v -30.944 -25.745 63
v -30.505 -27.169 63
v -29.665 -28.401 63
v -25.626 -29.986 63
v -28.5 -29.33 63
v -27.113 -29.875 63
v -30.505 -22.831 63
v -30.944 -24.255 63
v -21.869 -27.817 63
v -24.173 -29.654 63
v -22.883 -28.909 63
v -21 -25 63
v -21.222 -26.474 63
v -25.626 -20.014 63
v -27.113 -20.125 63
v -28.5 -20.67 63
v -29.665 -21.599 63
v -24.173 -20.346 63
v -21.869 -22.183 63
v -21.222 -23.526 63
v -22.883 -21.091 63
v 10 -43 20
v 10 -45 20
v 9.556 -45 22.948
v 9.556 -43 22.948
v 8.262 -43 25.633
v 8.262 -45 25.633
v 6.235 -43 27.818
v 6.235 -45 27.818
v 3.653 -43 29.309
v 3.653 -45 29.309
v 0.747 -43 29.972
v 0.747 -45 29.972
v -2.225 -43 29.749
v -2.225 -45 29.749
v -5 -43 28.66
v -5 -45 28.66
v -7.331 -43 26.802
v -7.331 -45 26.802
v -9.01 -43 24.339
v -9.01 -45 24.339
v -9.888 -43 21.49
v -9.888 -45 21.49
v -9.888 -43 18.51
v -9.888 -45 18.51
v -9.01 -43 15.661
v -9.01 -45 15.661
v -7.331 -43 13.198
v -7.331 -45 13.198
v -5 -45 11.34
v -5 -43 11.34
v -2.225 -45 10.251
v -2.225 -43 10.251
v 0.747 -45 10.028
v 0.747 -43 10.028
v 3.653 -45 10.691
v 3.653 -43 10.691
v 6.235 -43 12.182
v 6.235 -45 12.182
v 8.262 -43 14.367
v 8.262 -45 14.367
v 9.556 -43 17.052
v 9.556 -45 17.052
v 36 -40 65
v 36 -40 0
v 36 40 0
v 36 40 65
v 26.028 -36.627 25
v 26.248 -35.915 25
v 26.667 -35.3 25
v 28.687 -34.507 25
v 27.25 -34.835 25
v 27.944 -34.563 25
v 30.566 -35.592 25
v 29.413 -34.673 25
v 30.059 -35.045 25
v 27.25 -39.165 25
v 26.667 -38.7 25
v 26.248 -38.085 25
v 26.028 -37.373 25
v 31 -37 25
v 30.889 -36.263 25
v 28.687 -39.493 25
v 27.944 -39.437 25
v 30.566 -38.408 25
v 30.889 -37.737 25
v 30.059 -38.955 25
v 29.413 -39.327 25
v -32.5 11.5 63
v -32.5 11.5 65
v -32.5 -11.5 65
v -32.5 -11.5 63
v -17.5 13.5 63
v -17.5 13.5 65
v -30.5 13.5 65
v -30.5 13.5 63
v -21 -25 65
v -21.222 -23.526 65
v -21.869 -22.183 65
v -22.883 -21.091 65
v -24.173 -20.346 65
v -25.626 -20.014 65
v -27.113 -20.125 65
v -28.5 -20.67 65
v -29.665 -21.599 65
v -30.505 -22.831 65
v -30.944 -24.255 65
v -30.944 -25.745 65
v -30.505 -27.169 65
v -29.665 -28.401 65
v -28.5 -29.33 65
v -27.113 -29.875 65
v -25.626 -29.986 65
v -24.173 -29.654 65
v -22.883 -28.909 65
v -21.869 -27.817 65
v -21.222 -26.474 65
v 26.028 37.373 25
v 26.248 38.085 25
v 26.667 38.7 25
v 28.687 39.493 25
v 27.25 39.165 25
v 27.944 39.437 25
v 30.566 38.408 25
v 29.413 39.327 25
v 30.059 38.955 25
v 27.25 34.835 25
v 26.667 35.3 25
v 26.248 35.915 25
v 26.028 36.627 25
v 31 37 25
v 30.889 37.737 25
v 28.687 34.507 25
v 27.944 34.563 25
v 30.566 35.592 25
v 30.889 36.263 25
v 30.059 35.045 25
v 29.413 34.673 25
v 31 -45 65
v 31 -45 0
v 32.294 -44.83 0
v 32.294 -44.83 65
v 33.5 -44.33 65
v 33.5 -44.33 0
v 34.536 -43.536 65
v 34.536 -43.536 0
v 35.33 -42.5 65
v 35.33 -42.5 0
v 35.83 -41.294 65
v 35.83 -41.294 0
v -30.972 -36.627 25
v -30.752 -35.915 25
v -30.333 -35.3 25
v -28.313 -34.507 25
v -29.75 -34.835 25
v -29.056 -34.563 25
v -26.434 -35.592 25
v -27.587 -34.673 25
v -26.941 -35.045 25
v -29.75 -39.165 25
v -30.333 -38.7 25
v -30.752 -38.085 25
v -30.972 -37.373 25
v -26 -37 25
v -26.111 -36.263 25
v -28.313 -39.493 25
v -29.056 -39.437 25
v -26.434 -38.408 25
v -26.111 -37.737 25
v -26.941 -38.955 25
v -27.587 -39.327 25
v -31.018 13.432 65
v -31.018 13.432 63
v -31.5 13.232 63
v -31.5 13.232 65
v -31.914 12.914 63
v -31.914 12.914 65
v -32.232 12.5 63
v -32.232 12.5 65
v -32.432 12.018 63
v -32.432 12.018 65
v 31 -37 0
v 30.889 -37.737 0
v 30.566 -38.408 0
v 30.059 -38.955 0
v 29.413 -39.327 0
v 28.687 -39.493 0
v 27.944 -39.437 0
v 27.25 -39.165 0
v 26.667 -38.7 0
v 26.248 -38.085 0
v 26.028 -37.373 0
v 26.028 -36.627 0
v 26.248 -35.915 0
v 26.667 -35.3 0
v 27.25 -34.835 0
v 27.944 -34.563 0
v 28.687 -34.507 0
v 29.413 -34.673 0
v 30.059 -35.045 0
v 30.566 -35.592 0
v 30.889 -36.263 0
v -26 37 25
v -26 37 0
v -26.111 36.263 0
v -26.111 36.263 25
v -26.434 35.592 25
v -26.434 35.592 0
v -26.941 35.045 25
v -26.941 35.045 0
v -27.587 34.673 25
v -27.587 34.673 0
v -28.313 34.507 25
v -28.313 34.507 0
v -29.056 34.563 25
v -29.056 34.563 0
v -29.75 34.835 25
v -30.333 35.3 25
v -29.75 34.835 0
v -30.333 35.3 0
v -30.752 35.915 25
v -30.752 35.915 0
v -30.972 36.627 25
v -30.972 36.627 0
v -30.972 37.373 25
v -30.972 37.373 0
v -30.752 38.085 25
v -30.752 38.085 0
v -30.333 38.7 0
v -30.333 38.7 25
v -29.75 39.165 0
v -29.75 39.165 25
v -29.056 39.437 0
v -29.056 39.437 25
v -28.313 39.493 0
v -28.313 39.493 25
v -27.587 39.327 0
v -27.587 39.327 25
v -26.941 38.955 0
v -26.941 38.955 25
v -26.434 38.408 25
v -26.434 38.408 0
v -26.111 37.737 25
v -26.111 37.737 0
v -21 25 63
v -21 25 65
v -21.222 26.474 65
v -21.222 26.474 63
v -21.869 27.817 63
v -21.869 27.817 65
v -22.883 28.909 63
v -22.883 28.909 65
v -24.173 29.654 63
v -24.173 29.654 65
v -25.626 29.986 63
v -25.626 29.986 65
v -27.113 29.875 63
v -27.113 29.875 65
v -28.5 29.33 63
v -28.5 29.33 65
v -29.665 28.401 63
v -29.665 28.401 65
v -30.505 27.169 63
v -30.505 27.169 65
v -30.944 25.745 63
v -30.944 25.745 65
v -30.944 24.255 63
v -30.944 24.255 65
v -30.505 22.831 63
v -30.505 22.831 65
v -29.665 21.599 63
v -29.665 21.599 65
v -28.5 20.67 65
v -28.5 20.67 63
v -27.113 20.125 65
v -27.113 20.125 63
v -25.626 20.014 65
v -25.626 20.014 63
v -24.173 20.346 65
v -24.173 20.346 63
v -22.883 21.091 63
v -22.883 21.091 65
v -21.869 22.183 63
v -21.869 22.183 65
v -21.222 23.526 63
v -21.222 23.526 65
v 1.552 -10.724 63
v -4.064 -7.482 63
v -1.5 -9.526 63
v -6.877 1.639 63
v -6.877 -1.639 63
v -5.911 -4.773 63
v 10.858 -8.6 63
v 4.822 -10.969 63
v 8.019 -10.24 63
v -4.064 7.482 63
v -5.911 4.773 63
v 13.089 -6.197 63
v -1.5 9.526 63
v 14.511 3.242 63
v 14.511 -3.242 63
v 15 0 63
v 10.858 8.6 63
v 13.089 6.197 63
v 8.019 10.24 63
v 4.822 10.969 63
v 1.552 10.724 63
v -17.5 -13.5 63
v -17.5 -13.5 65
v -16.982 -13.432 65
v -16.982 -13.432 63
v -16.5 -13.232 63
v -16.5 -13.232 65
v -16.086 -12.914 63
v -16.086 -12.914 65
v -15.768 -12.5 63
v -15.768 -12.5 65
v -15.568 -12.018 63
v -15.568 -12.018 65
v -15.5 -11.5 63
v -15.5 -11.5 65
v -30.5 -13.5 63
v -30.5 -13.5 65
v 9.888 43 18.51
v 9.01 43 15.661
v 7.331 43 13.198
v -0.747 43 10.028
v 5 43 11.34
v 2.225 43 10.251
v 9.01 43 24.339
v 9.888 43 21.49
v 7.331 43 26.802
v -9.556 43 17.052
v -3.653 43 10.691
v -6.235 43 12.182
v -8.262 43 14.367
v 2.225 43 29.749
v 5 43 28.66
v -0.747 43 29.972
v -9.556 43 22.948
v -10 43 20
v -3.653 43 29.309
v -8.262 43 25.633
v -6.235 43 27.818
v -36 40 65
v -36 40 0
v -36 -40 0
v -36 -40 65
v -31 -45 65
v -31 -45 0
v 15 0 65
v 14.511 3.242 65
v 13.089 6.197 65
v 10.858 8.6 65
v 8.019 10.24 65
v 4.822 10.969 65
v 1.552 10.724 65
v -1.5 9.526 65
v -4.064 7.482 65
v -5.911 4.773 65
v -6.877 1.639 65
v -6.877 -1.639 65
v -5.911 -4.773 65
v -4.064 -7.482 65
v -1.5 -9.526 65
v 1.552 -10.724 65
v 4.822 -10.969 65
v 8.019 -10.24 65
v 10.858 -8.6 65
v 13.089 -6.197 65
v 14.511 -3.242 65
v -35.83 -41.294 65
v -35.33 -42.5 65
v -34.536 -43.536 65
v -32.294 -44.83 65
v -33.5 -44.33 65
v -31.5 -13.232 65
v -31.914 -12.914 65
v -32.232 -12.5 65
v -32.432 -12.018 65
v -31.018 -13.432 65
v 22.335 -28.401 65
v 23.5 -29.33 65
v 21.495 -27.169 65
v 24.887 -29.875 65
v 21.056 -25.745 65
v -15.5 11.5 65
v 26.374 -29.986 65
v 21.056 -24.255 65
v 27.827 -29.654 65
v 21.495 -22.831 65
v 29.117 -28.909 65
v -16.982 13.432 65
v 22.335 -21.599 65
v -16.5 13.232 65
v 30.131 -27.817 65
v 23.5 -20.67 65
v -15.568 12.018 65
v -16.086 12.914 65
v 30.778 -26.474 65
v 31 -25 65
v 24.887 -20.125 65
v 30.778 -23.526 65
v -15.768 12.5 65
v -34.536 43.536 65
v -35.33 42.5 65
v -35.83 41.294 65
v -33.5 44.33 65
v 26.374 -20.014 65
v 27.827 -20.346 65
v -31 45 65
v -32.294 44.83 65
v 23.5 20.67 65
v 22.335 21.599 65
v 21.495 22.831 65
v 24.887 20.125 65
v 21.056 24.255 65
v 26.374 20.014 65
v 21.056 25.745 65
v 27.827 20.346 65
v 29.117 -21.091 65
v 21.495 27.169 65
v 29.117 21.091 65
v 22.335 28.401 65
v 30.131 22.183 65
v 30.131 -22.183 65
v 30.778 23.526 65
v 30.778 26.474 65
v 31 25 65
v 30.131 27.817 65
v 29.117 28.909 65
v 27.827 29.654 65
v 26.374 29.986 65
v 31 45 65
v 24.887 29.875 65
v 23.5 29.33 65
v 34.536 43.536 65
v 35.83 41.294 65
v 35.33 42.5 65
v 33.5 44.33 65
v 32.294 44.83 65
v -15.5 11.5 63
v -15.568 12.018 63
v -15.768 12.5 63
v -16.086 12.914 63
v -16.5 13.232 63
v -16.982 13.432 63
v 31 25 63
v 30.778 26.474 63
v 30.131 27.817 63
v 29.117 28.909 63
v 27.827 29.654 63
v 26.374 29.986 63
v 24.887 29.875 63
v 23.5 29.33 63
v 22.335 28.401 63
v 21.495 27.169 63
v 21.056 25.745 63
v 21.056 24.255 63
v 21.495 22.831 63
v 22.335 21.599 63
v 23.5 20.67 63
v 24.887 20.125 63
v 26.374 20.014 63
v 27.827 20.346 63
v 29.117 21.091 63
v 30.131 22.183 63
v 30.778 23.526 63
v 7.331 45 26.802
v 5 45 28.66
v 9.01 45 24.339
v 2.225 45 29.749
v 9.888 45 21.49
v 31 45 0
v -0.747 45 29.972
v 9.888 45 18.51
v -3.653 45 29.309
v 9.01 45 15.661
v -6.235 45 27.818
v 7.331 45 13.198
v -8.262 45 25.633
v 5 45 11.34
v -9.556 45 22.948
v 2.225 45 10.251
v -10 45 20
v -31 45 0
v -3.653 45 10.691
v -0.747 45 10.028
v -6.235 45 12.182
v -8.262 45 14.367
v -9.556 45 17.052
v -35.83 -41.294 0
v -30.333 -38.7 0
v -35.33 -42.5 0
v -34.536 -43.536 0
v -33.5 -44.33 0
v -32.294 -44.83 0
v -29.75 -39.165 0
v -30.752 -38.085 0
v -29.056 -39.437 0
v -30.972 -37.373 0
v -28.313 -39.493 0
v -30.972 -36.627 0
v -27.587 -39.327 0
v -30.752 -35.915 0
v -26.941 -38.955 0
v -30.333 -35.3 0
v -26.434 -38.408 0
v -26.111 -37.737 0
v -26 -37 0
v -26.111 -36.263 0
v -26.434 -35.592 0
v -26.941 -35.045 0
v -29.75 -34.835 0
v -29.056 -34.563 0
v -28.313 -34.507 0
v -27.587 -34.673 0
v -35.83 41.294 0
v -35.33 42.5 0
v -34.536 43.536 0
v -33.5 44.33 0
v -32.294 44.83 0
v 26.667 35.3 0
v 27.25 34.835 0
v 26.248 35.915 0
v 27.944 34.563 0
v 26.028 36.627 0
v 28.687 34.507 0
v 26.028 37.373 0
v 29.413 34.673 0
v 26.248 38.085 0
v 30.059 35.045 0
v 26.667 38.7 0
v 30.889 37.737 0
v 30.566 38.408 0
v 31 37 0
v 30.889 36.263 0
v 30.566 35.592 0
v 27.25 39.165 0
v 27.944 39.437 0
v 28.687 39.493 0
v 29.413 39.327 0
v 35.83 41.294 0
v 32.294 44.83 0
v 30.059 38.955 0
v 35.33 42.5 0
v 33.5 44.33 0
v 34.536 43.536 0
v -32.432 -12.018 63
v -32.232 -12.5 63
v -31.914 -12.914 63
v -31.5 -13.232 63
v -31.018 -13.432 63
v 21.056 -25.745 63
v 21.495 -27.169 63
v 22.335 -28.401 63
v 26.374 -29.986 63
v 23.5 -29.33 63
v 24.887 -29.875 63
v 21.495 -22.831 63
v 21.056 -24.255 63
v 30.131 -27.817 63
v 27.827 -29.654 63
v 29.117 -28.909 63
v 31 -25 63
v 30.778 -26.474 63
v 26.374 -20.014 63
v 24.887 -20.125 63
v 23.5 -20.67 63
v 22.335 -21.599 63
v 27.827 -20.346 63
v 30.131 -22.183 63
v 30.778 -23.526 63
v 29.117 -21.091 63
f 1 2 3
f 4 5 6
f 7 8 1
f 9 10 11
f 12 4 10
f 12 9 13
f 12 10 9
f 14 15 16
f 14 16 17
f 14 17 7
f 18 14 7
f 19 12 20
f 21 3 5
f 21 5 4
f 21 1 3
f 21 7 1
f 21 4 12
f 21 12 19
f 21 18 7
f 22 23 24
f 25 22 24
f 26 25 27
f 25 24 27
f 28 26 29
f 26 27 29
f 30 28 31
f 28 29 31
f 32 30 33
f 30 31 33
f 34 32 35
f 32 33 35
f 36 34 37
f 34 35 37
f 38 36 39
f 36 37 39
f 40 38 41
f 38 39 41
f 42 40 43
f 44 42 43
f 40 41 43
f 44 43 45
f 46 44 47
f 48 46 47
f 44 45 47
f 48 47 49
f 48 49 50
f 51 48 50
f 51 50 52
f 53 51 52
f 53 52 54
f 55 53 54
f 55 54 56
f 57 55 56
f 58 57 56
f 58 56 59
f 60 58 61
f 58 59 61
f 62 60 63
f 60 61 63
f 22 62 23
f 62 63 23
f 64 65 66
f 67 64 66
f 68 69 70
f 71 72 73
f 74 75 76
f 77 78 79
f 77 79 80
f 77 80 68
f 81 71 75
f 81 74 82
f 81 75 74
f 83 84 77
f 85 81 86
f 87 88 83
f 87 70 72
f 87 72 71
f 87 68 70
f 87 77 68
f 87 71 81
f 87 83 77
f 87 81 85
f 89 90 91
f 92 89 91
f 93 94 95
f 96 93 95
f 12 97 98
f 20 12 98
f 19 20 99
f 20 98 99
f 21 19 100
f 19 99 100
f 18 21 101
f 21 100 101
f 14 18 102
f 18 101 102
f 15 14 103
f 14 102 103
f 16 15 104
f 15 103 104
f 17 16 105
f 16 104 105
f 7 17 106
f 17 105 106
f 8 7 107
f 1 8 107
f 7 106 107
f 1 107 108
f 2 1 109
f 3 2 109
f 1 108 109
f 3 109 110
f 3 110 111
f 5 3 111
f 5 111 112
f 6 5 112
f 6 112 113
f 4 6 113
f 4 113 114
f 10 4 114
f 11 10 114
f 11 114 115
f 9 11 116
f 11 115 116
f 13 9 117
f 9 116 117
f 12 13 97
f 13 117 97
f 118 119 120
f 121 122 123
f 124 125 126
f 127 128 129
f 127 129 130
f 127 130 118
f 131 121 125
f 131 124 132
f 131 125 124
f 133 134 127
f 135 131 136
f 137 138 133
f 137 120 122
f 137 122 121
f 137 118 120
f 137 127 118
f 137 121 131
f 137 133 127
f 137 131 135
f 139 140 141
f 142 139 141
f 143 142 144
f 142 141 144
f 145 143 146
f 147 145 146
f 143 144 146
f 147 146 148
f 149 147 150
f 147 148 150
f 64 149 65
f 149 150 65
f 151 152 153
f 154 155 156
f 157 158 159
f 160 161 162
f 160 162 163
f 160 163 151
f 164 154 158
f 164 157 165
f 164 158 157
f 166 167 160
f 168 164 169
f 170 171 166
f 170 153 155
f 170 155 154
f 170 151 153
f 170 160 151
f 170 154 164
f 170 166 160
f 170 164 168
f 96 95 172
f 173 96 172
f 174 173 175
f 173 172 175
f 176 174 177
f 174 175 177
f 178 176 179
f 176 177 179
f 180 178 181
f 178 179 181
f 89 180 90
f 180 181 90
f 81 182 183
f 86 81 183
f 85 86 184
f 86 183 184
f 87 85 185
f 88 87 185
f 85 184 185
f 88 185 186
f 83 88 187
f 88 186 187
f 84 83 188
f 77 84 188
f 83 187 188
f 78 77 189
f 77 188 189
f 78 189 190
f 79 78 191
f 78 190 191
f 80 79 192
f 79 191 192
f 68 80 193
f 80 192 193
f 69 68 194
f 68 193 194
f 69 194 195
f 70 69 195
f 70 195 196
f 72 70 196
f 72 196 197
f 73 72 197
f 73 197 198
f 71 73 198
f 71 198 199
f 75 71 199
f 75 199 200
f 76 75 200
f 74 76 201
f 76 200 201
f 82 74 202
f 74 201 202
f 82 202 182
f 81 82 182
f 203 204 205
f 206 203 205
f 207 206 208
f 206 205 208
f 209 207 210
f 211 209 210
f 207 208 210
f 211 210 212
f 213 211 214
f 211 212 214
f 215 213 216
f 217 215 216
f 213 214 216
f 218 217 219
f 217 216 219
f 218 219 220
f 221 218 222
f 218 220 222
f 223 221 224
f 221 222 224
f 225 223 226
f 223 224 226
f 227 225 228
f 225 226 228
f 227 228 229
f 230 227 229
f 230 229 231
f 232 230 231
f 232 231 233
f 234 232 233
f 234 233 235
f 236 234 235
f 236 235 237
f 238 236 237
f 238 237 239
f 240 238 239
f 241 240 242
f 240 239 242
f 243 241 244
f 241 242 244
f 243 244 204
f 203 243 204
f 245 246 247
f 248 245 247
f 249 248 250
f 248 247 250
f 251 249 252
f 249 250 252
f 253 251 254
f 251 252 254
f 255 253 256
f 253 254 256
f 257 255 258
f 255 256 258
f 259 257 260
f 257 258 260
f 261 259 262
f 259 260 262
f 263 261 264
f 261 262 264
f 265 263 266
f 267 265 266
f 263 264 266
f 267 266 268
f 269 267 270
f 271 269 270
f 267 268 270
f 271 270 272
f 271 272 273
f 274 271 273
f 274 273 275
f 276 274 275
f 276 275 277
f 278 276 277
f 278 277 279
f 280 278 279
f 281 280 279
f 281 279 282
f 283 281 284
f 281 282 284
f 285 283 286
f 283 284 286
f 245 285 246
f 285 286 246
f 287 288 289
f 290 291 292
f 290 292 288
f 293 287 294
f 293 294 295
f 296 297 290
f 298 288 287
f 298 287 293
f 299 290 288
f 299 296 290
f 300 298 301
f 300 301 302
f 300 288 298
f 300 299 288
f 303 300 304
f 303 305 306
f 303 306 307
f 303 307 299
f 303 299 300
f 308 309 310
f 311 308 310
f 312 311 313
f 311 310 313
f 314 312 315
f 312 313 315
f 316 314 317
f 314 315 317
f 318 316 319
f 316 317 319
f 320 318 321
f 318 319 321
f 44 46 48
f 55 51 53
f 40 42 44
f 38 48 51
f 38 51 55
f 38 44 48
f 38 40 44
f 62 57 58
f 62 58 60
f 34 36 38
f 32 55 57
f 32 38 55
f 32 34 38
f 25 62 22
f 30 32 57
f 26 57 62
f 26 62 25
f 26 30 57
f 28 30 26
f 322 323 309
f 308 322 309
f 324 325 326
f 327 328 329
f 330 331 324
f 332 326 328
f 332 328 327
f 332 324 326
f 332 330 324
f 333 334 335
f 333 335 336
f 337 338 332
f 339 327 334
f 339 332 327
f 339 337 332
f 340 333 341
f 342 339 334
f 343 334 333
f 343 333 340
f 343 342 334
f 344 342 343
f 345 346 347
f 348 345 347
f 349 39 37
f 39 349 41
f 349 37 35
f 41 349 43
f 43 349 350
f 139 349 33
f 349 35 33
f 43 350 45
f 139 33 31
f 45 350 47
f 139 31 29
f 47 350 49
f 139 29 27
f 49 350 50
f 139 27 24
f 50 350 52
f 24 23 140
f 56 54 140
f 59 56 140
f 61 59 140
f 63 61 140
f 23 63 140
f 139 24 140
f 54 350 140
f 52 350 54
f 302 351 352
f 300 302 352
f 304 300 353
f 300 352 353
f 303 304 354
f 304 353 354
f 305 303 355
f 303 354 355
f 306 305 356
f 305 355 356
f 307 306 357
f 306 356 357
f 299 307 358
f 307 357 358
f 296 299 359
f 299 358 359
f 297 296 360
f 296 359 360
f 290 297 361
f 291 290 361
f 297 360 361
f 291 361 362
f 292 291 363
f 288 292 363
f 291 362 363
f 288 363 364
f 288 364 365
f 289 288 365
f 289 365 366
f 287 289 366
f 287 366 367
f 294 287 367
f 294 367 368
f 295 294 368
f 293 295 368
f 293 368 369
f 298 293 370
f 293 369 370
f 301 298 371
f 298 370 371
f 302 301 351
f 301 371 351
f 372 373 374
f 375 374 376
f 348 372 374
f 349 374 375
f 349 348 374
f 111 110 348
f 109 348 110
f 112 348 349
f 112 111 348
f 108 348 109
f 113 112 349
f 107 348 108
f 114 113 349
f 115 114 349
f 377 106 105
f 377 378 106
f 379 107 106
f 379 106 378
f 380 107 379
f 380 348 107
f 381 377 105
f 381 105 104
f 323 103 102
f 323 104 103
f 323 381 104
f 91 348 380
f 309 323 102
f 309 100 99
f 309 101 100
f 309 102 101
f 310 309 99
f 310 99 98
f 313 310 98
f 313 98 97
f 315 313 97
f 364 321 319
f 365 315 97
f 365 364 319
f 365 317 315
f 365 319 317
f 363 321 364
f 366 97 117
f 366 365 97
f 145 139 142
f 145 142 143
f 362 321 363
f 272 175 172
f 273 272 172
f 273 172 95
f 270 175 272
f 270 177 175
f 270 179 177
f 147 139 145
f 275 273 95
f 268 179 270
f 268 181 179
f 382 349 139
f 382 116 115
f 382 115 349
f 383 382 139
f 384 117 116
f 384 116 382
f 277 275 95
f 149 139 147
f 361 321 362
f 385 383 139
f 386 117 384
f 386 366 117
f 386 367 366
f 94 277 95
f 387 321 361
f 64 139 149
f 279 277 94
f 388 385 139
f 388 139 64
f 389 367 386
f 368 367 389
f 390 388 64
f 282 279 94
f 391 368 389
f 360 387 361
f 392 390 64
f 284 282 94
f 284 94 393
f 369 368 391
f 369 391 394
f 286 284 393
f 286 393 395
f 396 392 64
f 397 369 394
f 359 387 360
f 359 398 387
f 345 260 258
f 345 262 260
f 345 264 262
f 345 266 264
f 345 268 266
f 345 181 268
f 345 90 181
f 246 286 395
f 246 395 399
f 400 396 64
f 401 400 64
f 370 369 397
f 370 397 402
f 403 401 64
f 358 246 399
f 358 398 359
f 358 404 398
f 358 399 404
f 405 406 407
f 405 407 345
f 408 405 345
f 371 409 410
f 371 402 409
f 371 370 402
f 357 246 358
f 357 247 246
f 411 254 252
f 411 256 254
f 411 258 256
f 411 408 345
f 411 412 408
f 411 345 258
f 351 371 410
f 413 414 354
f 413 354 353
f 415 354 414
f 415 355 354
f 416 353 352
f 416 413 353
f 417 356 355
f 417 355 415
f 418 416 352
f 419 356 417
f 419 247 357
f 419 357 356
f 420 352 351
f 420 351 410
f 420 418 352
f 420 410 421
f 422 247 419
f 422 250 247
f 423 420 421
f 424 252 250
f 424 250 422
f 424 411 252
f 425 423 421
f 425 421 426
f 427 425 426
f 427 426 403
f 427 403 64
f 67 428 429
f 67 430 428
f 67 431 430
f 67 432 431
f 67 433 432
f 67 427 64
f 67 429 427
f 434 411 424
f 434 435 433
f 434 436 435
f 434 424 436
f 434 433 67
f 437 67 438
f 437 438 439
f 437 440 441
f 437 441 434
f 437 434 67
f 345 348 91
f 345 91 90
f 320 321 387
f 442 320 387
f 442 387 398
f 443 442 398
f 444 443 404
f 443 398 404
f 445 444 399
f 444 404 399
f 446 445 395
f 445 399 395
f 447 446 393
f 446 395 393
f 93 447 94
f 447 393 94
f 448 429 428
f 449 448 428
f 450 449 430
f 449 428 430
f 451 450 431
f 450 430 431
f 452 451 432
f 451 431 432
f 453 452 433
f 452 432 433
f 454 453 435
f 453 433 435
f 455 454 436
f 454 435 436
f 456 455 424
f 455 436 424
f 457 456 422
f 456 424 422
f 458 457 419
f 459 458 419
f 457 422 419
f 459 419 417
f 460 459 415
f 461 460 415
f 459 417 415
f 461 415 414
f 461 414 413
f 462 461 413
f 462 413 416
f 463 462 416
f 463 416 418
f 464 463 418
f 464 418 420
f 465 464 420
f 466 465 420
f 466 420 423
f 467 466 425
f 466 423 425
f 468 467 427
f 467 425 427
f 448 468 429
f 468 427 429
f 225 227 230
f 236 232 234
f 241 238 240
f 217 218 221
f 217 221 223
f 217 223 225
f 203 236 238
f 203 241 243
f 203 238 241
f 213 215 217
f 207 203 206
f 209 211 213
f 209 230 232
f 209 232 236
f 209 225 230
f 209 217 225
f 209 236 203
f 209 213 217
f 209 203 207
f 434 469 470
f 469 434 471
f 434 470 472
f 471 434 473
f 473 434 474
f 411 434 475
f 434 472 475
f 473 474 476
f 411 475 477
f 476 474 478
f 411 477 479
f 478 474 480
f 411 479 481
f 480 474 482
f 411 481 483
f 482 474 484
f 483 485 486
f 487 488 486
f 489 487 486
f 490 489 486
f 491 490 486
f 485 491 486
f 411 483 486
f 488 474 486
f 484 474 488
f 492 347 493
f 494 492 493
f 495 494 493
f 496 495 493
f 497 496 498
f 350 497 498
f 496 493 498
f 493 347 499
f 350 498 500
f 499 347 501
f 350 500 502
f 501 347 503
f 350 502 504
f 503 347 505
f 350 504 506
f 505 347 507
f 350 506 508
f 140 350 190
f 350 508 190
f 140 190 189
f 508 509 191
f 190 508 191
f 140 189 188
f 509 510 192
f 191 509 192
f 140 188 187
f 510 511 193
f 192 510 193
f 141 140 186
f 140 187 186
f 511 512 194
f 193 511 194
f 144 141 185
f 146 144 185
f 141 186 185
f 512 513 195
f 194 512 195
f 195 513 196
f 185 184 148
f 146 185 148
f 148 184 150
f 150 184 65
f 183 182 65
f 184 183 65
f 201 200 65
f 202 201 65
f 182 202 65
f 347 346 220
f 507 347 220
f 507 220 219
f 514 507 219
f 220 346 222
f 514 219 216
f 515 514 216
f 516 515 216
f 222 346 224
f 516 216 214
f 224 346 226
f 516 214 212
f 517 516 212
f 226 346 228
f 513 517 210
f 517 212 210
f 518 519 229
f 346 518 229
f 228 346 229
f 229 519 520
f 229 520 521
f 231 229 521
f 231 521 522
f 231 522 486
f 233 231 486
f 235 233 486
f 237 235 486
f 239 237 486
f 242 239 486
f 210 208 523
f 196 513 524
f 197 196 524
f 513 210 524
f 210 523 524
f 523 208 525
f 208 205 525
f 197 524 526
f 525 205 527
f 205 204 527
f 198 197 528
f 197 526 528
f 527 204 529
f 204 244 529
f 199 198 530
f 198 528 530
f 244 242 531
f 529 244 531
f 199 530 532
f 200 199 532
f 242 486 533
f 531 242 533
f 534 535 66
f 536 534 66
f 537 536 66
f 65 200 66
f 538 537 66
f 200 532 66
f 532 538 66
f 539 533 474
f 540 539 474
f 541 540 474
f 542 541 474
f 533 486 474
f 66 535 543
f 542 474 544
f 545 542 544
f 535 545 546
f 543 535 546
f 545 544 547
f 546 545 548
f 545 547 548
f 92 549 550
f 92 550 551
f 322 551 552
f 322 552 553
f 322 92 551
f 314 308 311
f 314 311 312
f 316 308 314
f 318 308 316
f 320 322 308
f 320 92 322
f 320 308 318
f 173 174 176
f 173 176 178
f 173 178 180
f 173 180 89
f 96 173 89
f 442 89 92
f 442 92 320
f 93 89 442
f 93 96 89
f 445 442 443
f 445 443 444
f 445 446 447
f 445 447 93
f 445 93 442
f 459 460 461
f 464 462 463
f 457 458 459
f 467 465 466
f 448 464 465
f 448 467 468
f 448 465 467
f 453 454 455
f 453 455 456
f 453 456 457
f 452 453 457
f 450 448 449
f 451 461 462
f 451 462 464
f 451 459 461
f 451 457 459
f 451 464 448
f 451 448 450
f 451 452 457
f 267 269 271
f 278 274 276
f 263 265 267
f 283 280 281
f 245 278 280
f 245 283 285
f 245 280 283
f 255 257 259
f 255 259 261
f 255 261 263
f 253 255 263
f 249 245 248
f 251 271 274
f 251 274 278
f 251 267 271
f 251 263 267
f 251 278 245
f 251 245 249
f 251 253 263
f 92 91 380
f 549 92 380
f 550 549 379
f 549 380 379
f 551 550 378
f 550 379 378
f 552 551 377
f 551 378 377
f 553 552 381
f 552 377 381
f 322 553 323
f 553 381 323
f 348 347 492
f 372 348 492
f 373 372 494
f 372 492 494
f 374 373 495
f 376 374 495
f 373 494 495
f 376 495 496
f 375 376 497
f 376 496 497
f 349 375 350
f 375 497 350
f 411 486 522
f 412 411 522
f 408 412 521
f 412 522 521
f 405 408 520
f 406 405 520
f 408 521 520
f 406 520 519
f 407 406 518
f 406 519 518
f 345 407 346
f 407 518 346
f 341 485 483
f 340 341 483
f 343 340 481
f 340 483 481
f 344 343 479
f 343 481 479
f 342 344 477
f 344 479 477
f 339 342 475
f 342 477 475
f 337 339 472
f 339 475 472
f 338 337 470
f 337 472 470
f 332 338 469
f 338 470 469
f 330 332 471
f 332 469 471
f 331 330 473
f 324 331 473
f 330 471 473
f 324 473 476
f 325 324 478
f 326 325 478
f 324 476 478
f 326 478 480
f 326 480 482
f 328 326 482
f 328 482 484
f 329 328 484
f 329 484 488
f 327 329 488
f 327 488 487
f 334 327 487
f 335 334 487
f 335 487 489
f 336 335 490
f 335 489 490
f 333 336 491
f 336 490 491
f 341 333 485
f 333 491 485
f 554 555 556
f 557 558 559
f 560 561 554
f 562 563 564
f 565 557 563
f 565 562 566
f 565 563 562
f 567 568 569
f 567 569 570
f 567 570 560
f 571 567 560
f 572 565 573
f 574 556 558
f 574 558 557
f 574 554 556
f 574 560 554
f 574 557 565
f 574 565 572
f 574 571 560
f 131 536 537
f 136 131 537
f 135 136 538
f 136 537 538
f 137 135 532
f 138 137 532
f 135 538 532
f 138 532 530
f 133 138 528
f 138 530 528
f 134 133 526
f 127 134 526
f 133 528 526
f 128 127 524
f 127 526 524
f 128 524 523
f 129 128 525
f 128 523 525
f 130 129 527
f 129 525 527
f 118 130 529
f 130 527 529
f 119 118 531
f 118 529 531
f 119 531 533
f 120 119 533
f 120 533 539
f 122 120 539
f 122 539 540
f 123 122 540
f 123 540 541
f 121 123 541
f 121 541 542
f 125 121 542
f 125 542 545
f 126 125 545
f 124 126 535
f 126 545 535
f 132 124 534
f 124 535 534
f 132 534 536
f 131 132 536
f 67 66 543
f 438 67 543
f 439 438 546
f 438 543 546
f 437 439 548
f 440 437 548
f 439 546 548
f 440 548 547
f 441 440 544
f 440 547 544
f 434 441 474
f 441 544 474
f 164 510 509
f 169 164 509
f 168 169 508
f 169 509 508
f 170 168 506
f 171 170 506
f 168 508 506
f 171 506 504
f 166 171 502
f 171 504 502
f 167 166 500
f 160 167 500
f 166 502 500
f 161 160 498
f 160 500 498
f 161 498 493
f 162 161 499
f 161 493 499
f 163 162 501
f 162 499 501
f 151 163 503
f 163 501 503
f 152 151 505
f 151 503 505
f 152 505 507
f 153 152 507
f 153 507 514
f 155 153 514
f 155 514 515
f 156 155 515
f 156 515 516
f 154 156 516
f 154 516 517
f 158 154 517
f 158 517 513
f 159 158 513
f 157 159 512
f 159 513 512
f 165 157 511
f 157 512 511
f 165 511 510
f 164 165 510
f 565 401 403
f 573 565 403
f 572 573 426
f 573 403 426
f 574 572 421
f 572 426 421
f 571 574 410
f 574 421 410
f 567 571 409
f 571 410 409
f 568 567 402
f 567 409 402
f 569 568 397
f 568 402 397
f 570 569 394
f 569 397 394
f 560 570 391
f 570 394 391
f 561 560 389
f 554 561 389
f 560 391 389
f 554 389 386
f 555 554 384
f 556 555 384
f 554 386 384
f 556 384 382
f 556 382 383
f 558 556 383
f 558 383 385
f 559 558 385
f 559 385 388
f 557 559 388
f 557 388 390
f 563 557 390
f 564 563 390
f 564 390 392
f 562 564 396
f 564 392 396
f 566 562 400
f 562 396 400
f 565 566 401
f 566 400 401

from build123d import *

# Parameters (mm, degrees)
F1_DEPTH = 65
F2_R     = 11
F2_R_2   = 5
F3_DEPTH = 2
F4_R     = 10
F5_DEPTH = 2
F6_R     = 10
F7_DEPTH = 2
F8_R     = 2.5
F9_DEPTH = 25


with BuildPart() as f1:
    # F0 (on Top) → F1 (new body)
    with BuildSketch(Plane.XY):
        with BuildLine():
            Line((-31, -45), (31, -45))
            ThreePointArc((31, -45), (34.535534, -43.535534), (36, -40))
            Line((36, -40), (36, 40))
            ThreePointArc((36, 40), (34.535534, 43.535534), (31, 45))
            Line((31, 45), (-31, 45))
            ThreePointArc((-31, 45), (-34.535534, 43.535534), (-36, 40))
            Line((-36, 40), (-36, -40))
            ThreePointArc((-36, -40), (-34.535534, -43.535534), (-31, -45))
        make_face()
    extrude(amount=F1_DEPTH)

    # F2 (on face) → F3 (cut)
    with BuildSketch(Plane.XY.offset(65)):
        with Locations((4, 0)):
            Circle(F2_R)
        with BuildLine():
            ThreePointArc((-15.5, 11.5), (-16.085786, 12.914214), (-17.5, 13.5))
            Line((-17.5, 13.5), (-30.5, 13.5))
            ThreePointArc((-30.5, 13.5), (-31.914214, 12.914214), (-32.5, 11.5))
            Line((-32.5, 11.5), (-32.5, -11.5))
            ThreePointArc((-32.5, -11.5), (-31.914214, -12.914214), (-30.5, -13.5))
            Line((-30.5, -13.5), (-17.5, -13.5))
            ThreePointArc((-17.5, -13.5), (-16.085786, -12.914214), (-15.5, -11.5))
            Line((-15.5, -11.5), (-15.5, 11.5))
        make_face()
        with Locations((-26, 25)):
            Circle(F2_R_2)
        with Locations((26, 25)):
            Circle(F2_R_2)
        with Locations((26, -25)):
            Circle(F2_R_2)
        with Locations((-26, -25)):
            Circle(F2_R_2)
    extrude(amount=-F3_DEPTH, mode=Mode.SUBTRACT)

    # F4 (on face) → F5 (cut)
    with BuildSketch(Plane(origin=(0, 45, 0), x_dir=(-1, 0, 0), z_dir=(0, 1, 0))):
        with Locations((0, 20)):
            Circle(F4_R)
    extrude(amount=-F5_DEPTH, mode=Mode.SUBTRACT)

    # F6 (on face) → F7 (cut)
    with BuildSketch(Plane.XZ.offset(45)):
        with Locations((0, 20)):
            Circle(F6_R)
    extrude(amount=-F7_DEPTH, mode=Mode.SUBTRACT)

    # F8 (on face) → F9 (cut)
    with BuildSketch(Plane(origin=(0, 0, 0), x_dir=(1, 0, 0), z_dir=(0, 0, -1))):
        with Locations((28.5, -37)):
            Circle(F8_R)
        with Locations((-28.5, -37)):
            Circle(F8_R)
        with Locations((-28.5, 37)):
            Circle(F8_R)
        with Locations((28.5, 37)):
            Circle(F8_R)
    extrude(amount=-F9_DEPTH, mode=Mode.SUBTRACT)


solid = f1.part
